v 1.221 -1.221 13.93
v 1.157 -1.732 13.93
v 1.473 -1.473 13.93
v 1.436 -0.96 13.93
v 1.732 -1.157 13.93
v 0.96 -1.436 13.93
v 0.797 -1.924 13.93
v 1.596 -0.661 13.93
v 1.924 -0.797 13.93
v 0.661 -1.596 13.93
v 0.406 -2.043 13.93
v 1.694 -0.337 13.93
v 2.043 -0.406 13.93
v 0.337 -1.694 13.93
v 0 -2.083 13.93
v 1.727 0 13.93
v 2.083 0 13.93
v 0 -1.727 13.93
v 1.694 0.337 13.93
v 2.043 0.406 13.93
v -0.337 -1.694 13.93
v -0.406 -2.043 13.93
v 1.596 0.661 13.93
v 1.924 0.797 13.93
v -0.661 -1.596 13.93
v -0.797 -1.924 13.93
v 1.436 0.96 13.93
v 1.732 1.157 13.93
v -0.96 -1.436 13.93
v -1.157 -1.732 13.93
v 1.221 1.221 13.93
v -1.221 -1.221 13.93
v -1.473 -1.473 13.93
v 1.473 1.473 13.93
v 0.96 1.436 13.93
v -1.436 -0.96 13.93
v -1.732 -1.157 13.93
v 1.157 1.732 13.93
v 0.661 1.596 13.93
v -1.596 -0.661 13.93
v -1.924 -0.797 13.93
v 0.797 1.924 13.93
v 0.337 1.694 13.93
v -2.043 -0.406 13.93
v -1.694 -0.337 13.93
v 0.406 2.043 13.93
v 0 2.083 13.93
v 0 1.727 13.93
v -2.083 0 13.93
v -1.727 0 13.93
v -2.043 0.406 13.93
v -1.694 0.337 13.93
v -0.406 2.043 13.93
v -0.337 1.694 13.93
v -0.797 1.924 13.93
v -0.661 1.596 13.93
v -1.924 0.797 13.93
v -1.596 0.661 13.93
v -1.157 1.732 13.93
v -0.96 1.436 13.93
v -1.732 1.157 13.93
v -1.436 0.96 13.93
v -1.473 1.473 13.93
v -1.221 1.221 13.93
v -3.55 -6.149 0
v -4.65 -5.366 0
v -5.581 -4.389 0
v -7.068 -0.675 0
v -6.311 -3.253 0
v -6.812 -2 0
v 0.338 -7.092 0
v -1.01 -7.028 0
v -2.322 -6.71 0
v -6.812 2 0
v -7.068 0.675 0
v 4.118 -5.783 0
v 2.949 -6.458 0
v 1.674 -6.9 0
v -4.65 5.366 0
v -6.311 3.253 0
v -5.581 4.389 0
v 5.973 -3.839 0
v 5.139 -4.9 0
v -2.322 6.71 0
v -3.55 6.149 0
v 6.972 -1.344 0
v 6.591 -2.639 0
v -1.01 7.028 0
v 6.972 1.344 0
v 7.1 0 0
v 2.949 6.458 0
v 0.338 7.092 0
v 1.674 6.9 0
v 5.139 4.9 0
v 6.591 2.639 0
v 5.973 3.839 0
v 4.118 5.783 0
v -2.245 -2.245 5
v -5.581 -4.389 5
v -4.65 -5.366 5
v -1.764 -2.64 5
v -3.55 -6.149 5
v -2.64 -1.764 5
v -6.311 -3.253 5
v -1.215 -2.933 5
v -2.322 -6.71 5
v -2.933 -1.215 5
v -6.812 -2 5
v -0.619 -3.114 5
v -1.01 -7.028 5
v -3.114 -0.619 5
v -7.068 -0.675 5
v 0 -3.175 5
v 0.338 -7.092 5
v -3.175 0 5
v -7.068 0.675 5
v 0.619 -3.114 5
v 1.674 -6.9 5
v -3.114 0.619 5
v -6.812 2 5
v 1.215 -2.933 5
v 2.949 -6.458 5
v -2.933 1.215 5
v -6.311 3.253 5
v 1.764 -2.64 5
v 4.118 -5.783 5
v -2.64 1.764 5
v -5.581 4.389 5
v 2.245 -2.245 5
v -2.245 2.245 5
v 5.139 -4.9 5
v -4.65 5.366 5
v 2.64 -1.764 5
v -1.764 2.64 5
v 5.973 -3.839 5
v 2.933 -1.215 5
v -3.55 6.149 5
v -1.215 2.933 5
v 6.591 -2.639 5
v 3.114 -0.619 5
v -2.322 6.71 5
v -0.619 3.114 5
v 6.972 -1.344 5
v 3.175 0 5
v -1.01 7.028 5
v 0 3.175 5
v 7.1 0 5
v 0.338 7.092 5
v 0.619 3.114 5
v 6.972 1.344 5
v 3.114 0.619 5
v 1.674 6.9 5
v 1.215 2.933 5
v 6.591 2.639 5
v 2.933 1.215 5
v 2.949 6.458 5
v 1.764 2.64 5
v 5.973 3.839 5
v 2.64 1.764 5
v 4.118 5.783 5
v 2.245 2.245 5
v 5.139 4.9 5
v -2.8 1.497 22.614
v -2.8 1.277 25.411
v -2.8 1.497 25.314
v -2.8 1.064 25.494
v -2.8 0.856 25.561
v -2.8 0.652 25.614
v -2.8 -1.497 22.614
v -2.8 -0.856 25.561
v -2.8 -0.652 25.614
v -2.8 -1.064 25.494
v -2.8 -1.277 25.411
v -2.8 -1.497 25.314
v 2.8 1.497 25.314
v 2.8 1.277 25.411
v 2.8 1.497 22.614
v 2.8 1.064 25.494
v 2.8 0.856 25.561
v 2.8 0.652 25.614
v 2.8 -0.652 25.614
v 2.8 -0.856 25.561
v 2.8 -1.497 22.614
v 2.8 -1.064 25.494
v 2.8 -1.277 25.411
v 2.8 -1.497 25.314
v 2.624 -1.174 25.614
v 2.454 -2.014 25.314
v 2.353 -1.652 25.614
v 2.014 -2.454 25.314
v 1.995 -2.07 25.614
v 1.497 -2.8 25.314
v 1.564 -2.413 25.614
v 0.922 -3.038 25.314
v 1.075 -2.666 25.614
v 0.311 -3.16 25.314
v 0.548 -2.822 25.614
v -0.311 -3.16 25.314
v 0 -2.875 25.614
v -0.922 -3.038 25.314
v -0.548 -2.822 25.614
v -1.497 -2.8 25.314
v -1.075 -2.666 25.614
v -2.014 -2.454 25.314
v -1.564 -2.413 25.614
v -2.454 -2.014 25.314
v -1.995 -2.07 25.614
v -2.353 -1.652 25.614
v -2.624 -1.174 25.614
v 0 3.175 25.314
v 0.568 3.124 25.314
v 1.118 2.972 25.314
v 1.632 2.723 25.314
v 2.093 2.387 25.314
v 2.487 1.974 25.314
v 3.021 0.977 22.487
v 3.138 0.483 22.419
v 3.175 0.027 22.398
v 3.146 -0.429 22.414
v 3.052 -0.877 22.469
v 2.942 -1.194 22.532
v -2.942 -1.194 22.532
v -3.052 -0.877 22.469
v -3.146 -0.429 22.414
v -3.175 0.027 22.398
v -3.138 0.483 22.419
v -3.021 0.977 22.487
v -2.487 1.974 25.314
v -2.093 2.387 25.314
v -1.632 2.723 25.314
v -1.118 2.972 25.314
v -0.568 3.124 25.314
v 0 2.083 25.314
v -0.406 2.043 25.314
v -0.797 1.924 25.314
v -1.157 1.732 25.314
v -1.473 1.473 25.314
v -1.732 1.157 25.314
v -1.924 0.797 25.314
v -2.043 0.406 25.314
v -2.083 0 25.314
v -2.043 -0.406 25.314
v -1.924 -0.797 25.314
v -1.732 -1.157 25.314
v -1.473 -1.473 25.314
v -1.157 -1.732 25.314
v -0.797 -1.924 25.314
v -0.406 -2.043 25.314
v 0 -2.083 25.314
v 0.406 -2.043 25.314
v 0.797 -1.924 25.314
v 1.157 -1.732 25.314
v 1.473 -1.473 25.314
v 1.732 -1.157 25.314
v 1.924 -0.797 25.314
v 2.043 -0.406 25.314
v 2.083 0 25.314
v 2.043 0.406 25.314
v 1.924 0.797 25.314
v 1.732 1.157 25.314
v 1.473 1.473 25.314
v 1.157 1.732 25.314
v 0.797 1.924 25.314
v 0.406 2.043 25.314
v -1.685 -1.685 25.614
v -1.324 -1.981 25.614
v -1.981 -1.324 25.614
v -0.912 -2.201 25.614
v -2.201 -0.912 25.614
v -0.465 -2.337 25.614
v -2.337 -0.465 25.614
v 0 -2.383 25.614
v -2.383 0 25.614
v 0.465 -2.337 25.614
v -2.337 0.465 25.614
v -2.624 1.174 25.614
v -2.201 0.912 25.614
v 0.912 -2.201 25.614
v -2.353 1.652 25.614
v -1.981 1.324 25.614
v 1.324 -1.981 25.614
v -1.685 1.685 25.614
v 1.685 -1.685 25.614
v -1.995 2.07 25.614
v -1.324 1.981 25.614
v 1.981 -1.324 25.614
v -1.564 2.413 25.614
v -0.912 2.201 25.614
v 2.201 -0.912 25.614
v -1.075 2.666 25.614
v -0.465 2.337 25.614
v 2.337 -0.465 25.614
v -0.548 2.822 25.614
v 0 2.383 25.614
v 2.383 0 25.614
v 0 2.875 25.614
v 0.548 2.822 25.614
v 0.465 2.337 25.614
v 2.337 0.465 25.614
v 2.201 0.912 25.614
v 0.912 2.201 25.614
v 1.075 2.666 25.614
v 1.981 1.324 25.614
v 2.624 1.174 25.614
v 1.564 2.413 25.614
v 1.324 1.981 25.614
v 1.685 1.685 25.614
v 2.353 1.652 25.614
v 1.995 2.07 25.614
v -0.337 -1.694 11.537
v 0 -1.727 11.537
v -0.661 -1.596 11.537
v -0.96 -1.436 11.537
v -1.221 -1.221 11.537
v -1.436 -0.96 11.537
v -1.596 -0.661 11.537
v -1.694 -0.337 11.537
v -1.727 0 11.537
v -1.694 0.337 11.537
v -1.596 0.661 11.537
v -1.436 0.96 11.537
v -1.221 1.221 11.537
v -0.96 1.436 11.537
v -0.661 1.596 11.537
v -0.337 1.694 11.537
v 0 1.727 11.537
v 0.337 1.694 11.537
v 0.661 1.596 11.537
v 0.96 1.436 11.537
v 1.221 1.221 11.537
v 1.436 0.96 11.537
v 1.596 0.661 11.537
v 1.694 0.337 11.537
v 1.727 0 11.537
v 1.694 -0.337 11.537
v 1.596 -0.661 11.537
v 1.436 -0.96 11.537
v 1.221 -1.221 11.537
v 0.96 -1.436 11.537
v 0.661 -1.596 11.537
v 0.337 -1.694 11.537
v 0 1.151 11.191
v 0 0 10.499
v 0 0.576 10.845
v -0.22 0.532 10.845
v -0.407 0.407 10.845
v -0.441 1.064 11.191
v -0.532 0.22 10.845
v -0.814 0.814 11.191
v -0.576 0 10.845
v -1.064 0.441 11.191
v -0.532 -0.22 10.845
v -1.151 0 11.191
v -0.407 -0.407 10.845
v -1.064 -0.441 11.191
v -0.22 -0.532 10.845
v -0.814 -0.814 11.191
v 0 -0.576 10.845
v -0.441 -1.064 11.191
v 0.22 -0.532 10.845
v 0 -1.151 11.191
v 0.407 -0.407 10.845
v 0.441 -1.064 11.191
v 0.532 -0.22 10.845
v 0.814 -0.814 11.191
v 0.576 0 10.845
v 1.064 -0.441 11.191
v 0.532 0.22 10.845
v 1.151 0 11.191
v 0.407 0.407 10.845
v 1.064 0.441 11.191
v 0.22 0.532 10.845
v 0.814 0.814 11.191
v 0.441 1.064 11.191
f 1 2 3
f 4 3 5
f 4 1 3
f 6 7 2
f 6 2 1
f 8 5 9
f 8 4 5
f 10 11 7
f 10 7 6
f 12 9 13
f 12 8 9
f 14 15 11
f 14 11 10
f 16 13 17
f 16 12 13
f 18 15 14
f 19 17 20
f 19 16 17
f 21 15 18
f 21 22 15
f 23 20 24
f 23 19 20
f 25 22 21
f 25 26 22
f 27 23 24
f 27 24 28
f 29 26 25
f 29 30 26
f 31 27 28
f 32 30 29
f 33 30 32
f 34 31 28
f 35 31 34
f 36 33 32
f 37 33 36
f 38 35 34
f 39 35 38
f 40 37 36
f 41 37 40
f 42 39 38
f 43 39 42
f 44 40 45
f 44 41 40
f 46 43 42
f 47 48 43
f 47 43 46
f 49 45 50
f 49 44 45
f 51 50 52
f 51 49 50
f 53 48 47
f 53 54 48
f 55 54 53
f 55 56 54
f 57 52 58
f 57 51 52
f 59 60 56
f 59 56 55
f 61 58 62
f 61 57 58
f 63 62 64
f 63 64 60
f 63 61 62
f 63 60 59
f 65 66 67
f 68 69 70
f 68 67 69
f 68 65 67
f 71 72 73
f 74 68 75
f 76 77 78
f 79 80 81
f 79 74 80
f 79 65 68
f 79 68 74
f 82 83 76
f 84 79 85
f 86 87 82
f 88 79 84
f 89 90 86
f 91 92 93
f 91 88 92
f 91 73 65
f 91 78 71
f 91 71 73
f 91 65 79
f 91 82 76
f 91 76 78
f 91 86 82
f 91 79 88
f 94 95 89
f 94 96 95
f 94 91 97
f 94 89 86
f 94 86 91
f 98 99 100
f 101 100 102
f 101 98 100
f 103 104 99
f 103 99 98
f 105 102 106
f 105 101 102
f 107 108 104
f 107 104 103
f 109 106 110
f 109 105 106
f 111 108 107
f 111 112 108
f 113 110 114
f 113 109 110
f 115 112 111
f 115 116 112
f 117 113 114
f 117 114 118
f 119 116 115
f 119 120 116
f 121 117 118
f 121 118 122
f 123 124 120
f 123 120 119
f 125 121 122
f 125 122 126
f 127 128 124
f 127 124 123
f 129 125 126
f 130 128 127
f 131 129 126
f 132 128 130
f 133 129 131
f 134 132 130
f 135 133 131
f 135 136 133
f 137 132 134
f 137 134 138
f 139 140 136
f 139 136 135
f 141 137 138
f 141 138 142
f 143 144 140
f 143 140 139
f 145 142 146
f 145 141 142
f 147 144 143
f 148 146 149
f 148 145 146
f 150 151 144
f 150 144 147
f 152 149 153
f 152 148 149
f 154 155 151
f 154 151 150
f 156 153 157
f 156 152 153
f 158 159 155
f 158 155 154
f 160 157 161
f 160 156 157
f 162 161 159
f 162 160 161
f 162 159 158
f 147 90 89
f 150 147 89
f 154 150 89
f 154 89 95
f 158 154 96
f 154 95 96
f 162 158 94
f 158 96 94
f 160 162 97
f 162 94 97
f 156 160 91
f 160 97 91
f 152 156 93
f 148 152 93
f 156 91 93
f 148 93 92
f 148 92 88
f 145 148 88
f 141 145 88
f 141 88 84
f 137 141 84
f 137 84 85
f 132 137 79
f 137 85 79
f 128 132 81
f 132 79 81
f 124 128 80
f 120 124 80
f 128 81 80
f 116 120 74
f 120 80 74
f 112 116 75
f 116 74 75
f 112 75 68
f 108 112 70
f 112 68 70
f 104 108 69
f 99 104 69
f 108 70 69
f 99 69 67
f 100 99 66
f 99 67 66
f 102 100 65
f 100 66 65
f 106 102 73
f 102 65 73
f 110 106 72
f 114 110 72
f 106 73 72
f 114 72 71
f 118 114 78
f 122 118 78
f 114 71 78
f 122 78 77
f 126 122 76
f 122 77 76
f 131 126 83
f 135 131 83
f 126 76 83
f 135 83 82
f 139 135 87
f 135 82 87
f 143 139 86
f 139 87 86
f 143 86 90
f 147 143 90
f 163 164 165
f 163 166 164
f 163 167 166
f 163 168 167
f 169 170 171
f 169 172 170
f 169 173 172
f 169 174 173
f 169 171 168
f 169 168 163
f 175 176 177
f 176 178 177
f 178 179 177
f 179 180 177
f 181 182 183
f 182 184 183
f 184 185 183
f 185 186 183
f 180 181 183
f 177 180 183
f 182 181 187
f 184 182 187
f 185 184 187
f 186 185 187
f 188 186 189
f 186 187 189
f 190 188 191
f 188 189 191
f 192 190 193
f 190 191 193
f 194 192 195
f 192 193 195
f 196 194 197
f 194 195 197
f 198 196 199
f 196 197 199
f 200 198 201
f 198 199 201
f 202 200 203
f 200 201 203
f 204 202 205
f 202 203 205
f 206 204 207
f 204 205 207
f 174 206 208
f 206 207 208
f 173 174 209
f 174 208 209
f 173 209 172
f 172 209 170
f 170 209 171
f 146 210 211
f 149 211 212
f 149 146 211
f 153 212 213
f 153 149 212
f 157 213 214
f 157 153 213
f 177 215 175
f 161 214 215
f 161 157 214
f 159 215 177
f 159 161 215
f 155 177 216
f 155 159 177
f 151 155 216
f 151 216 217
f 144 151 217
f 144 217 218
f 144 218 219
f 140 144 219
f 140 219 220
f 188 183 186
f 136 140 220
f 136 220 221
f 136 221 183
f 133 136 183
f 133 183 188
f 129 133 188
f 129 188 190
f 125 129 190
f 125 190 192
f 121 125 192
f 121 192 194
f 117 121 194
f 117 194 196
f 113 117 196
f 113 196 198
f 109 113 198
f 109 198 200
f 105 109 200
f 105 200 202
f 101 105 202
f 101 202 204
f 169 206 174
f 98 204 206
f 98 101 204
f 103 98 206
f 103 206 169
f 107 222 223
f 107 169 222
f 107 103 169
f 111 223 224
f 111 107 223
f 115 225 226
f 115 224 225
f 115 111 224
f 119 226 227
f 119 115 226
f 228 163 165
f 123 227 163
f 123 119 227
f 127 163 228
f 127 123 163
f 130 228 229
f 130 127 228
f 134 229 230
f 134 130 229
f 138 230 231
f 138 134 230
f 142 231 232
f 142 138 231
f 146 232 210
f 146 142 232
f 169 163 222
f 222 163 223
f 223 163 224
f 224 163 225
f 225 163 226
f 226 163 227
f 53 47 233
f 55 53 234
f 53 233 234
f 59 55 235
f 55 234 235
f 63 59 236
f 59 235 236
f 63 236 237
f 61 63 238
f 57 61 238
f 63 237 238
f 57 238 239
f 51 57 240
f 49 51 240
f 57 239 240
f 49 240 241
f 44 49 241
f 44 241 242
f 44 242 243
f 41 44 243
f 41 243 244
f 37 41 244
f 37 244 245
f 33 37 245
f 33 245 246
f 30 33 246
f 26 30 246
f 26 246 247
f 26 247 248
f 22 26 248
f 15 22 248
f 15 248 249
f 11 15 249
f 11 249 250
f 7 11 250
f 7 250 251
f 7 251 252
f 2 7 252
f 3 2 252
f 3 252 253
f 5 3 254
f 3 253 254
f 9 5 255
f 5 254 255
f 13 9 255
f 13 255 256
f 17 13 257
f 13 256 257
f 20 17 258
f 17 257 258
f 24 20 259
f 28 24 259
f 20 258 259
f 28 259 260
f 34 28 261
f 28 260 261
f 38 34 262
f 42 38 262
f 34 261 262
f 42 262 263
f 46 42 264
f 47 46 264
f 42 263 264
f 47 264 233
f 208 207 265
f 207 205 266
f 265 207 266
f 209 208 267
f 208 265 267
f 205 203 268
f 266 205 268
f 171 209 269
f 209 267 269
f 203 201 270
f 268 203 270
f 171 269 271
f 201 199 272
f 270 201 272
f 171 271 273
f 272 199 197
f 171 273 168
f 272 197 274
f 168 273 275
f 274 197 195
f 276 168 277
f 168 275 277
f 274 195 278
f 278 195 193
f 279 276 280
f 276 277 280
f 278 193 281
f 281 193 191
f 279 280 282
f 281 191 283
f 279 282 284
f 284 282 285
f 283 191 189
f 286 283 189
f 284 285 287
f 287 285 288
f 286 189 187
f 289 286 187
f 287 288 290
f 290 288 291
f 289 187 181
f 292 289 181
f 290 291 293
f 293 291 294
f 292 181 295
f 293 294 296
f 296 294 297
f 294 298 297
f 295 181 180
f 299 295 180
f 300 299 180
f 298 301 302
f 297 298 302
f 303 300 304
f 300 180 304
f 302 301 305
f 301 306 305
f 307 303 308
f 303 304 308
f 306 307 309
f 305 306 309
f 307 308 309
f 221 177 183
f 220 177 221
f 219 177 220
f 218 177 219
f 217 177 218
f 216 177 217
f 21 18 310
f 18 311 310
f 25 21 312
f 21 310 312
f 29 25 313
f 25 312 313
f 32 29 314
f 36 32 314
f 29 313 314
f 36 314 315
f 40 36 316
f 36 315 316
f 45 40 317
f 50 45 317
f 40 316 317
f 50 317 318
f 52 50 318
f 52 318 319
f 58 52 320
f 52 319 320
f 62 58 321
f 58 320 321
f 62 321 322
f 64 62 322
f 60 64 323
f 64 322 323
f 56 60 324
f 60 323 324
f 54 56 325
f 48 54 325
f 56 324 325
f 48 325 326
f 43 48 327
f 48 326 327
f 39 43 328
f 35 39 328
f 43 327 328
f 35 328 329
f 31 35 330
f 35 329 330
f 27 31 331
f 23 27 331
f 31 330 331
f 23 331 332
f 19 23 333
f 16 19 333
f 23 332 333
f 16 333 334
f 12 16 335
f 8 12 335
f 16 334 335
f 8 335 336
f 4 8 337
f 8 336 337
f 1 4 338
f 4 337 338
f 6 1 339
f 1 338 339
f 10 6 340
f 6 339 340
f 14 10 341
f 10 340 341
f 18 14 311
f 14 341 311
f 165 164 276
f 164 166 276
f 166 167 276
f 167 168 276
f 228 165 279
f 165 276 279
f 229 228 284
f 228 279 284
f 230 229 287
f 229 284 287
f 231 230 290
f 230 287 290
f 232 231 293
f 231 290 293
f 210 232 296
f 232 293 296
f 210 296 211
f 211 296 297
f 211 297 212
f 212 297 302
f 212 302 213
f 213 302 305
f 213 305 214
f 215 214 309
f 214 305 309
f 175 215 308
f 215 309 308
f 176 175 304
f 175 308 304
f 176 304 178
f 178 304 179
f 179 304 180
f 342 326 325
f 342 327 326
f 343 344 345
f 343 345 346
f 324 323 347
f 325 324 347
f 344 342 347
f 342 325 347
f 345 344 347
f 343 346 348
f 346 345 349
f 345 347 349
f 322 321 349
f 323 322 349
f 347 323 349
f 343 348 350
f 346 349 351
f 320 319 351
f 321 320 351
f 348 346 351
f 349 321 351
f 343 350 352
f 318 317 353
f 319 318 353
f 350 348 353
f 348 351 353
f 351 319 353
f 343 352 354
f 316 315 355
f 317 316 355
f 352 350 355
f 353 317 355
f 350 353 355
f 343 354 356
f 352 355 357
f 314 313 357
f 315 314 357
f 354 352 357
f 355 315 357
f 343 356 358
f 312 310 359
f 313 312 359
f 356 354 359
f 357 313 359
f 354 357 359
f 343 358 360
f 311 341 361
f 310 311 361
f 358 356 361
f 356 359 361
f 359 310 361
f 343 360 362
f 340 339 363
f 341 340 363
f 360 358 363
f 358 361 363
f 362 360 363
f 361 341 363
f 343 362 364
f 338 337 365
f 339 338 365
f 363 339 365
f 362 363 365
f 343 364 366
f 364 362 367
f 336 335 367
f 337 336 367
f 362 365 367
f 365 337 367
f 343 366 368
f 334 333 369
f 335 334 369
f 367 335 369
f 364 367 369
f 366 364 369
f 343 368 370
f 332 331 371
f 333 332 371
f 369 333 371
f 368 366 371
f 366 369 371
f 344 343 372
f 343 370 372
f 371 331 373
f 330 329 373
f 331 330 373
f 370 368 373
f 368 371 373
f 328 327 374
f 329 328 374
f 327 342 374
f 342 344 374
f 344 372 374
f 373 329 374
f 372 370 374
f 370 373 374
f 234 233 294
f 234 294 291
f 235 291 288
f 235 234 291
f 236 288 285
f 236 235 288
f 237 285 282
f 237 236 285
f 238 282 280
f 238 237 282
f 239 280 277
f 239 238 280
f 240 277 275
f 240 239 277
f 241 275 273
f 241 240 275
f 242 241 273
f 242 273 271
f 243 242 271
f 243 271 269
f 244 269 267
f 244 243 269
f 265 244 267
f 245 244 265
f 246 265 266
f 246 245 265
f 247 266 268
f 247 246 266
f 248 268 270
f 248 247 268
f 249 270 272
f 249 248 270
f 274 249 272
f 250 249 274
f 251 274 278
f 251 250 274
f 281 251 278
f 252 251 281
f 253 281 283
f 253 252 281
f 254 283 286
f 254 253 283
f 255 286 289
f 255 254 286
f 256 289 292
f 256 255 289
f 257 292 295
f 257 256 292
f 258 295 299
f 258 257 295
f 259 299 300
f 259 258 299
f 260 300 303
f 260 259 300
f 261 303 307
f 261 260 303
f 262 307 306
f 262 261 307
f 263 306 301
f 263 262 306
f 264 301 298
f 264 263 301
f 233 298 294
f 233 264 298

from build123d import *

# Parameters (mm, degrees)
SKETCH1_R                              = 7.1
PISTON_DEPTH                           = 5
SKETCH2_R                              = 3.175
ROD_DEPTH                              = 25.614
F_056_8_32_INTERNAL_THREAD_D           = 3.4544
F_056_8_32_INTERNAL_THREAD_DEPTH       = 14.07744
F_056_8_32_INTERNAL_THREAD_CBORE_D     = 4.1656
F_056_8_32_INTERNAL_THREAD_CBORE_DEPTH = 11.684
F_056_8_32_INTERNAL_THREAD_TIP         = 1.037806461
ROD_END_CHAMFER_SIZE                   = 0.3
WRENCH_FLATS_DEPTH                     = 28.511761049
WRENCH_FLATS_DEPTH_BACK                = 28.511761049


with BuildPart() as part:
    # Sketch1 → Piston (new body)
    with BuildSketch(Plane.XY):
        Circle(SKETCH1_R)
    extrude(amount=PISTON_DEPTH)

    # Sketch2 → Rod (add)
    with BuildSketch(Plane(origin=(0, 0, 0), x_dir=(-1, 0, 0), z_dir=(0, 0, -1))):
        with Locations(Location((0, 0, 0), (0, 0, 90))):
            Circle(SKETCH2_R)
    extrude(amount=-ROD_DEPTH)

    # 056 #8-32 Internal Thread
    with Locations(Plane(origin=(0, 0, 25.614), x_dir=(0, 1, 0), z_dir=(0, 0, 1))):
        with Locations((0, 0)):
            CounterBoreHole(F_056_8_32_INTERNAL_THREAD_D / 2, F_056_8_32_INTERNAL_THREAD_CBORE_D / 2, F_056_8_32_INTERNAL_THREAD_CBORE_DEPTH, depth=F_056_8_32_INTERNAL_THREAD_DEPTH)
            with Locations((0, 0, -(F_056_8_32_INTERNAL_THREAD_DEPTH + F_056_8_32_INTERNAL_THREAD_TIP / 2))):  # 118° drill point
                Cone(0, F_056_8_32_INTERNAL_THREAD_D / 2, F_056_8_32_INTERNAL_THREAD_TIP, mode=Mode.SUBTRACT)

    # Rod End Chamfer
    rod_end_chamfer_edges = [part.edges().sort_by_distance(p)[0] for p in [
        (0, -2.0828, 25.614),
        (0, -3.175, 25.614),
    ]]
    chamfer(rod_end_chamfer_edges, length=ROD_END_CHAMFER_SIZE)

    # Sketch11 → Wrench Flats (cut, two sides: drawn at the far end of the back side and taken through both)
    with BuildSketch(Plane(origin=(0, 0, 0), x_dir=(1, 0, 0), z_dir=(0, 1, 0)).offset(-WRENCH_FLATS_DEPTH_BACK)):
        Polygon((-2.8, -25.614), (-2.8, -22.614), (-7.8, -19.727248654), (-7.8, -25.614), align=None)
        Polygon((2.8, -25.614), (2.8, -22.614), (7.8, -19.727248654), (7.8, -25.614), align=None)
    extrude(amount=WRENCH_FLATS_DEPTH + WRENCH_FLATS_DEPTH_BACK, mode=Mode.SUBTRACT)


solid = part.part
